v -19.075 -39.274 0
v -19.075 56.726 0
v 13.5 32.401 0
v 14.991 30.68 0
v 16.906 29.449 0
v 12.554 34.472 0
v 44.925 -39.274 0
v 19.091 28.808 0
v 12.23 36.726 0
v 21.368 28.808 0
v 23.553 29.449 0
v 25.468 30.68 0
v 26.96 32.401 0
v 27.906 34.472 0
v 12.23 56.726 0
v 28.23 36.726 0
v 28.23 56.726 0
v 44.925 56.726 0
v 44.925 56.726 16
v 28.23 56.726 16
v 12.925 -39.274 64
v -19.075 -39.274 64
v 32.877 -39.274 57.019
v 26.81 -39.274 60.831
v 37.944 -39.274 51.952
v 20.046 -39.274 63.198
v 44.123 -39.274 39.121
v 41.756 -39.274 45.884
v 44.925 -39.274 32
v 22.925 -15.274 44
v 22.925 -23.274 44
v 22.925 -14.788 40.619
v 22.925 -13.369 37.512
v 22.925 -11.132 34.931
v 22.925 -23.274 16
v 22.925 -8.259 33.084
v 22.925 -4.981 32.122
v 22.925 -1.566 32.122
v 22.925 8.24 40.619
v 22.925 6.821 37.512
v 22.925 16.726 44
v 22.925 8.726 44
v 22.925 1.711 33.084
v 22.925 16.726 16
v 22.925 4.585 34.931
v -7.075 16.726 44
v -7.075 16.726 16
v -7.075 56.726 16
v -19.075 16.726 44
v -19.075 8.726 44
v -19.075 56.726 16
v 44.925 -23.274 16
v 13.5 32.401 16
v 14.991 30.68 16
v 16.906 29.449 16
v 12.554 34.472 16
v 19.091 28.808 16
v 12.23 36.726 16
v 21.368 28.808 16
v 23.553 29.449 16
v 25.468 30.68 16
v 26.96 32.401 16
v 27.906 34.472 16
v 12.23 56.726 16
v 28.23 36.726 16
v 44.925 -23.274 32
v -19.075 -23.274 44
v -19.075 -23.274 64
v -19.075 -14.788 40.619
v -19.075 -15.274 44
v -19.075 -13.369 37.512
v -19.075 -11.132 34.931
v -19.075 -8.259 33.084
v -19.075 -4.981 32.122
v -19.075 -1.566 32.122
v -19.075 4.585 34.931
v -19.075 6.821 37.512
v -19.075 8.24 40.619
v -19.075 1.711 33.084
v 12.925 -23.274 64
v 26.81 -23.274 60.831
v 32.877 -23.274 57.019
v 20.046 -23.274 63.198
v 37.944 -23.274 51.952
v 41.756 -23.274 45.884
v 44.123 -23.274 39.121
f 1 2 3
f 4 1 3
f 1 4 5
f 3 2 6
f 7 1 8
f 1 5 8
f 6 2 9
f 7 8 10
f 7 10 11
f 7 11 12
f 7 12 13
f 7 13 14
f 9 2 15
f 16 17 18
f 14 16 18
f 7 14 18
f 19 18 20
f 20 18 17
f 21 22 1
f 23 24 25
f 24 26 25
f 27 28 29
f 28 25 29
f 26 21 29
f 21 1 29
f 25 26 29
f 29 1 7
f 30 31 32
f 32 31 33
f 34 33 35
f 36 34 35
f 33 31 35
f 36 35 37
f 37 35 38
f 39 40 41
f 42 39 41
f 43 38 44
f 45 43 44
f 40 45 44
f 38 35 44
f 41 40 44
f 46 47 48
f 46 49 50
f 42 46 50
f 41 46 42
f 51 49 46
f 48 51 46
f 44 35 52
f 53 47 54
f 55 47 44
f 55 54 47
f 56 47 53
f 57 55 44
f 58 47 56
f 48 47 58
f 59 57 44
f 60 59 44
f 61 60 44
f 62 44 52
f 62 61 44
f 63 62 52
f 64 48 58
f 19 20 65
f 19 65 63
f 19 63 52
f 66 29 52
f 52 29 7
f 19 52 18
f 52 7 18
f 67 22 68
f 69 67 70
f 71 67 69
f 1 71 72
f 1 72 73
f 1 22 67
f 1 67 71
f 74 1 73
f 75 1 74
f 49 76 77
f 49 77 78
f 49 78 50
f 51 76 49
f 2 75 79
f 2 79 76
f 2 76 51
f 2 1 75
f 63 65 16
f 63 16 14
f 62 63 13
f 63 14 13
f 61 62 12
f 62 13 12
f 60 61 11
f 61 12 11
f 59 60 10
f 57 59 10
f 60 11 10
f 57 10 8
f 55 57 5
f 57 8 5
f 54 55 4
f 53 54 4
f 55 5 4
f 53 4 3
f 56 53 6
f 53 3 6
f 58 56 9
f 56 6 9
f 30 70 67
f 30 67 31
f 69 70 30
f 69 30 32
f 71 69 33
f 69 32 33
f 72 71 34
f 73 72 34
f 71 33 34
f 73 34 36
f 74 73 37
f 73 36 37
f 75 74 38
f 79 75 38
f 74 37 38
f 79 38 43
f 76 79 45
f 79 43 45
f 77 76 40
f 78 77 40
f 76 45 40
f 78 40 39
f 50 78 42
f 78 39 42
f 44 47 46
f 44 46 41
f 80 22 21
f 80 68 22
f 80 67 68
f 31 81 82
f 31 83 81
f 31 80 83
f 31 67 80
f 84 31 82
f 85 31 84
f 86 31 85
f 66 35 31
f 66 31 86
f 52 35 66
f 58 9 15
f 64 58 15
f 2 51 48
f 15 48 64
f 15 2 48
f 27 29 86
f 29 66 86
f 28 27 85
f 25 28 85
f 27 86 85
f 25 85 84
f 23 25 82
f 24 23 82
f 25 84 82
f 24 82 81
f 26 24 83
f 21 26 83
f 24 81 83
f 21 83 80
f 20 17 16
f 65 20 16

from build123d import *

# Parameters (mm, degrees)
F1_DEPTH  = 16
F2_W      = 64
F2_H      = 16
F3_DEPTH  = 48
F4_R      = 32
F5_W      = 42
F5_H      = 40
F6_DEPTH  = 28
F8_DEPTH  = 50
F9_W      = 12
F9_H      = 40
F10_DEPTH = 28
F12_W     = 12
F12_H     = 48.826222
F13_DEPTH = 25


with BuildPart() as f1:
    # F0 (on Top) → F1 (new body)
    with BuildSketch(Plane.XY):
        with BuildLine():
            Line((-19.074771, -39.273684), (44.925229, -39.273684))
            Line((44.925229, -39.273684), (44.925229, 56.726316))
            Line((44.925229, 56.726316), (28.229578, 56.726316))
            Line((28.229578, 56.726316), (28.229578, 36.726316))
            ThreePointArc((28.229578, 36.726316), (20.229578, 28.726316), (12.229578, 36.726316))
            Line((12.229578, 36.726316), (12.229578, 56.726316))
            Line((12.229578, 56.726316), (-19.074771, 56.726316))
            Line((-19.074771, 56.726316), (-19.074771, -39.273684))
        make_face()
    extrude(amount=F1_DEPTH)

    # F2 (on face) → F3 (join)
    with BuildSketch(Plane.XY.offset(16)):
        with Locations((12.925229, -31.273684)):
            Rectangle(F2_W, F2_H)
    extrude(amount=F3_DEPTH)

    # F4
    f4_edges = [f1.edges().sort_by_distance(p)[0] for p in [
        (44.925229, -31.273684, 64),
    ]]
    fillet(f4_edges, radius=F4_R)

    # F5 (on face) → F6 (join)
    with BuildSketch(Plane.XY.offset(16)):
        with Locations((1.925229, -3.273684)):
            Rectangle(F5_W, F5_H)
    extrude(amount=F6_DEPTH)

    # F7 (on face) → F8 (cut)
    with BuildSketch(Plane.YZ.offset(22.925229)):
        with BuildLine():
            Line((8.726316, 44), (-15.273684, 44))
            ThreePointArc((-15.273684, 44), (-3.273684, 32), (8.726316, 44))
        make_face()
    extrude(amount=-F8_DEPTH, mode=Mode.SUBTRACT)

    # F9 (on face) → F10 (join)
    with BuildSketch(Plane.XY.offset(16)):
        with Locations((-13.074771, 36.726316)):
            Rectangle(F9_W, F9_H)
    extrude(amount=F10_DEPTH)

    # F12 (on face) → F13 (cut)
    with BuildSketch(Plane(origin=(0, 26.171742, 37.388202), x_dir=(1, 0, 0), z_dir=(0, 0.573462, 0.819232))):
        with Locations((-13.074771, 12.8835)):
            Rectangle(F12_W, F12_H)
    extrude(amount=F13_DEPTH, mode=Mode.SUBTRACT)


solid = f1.part
